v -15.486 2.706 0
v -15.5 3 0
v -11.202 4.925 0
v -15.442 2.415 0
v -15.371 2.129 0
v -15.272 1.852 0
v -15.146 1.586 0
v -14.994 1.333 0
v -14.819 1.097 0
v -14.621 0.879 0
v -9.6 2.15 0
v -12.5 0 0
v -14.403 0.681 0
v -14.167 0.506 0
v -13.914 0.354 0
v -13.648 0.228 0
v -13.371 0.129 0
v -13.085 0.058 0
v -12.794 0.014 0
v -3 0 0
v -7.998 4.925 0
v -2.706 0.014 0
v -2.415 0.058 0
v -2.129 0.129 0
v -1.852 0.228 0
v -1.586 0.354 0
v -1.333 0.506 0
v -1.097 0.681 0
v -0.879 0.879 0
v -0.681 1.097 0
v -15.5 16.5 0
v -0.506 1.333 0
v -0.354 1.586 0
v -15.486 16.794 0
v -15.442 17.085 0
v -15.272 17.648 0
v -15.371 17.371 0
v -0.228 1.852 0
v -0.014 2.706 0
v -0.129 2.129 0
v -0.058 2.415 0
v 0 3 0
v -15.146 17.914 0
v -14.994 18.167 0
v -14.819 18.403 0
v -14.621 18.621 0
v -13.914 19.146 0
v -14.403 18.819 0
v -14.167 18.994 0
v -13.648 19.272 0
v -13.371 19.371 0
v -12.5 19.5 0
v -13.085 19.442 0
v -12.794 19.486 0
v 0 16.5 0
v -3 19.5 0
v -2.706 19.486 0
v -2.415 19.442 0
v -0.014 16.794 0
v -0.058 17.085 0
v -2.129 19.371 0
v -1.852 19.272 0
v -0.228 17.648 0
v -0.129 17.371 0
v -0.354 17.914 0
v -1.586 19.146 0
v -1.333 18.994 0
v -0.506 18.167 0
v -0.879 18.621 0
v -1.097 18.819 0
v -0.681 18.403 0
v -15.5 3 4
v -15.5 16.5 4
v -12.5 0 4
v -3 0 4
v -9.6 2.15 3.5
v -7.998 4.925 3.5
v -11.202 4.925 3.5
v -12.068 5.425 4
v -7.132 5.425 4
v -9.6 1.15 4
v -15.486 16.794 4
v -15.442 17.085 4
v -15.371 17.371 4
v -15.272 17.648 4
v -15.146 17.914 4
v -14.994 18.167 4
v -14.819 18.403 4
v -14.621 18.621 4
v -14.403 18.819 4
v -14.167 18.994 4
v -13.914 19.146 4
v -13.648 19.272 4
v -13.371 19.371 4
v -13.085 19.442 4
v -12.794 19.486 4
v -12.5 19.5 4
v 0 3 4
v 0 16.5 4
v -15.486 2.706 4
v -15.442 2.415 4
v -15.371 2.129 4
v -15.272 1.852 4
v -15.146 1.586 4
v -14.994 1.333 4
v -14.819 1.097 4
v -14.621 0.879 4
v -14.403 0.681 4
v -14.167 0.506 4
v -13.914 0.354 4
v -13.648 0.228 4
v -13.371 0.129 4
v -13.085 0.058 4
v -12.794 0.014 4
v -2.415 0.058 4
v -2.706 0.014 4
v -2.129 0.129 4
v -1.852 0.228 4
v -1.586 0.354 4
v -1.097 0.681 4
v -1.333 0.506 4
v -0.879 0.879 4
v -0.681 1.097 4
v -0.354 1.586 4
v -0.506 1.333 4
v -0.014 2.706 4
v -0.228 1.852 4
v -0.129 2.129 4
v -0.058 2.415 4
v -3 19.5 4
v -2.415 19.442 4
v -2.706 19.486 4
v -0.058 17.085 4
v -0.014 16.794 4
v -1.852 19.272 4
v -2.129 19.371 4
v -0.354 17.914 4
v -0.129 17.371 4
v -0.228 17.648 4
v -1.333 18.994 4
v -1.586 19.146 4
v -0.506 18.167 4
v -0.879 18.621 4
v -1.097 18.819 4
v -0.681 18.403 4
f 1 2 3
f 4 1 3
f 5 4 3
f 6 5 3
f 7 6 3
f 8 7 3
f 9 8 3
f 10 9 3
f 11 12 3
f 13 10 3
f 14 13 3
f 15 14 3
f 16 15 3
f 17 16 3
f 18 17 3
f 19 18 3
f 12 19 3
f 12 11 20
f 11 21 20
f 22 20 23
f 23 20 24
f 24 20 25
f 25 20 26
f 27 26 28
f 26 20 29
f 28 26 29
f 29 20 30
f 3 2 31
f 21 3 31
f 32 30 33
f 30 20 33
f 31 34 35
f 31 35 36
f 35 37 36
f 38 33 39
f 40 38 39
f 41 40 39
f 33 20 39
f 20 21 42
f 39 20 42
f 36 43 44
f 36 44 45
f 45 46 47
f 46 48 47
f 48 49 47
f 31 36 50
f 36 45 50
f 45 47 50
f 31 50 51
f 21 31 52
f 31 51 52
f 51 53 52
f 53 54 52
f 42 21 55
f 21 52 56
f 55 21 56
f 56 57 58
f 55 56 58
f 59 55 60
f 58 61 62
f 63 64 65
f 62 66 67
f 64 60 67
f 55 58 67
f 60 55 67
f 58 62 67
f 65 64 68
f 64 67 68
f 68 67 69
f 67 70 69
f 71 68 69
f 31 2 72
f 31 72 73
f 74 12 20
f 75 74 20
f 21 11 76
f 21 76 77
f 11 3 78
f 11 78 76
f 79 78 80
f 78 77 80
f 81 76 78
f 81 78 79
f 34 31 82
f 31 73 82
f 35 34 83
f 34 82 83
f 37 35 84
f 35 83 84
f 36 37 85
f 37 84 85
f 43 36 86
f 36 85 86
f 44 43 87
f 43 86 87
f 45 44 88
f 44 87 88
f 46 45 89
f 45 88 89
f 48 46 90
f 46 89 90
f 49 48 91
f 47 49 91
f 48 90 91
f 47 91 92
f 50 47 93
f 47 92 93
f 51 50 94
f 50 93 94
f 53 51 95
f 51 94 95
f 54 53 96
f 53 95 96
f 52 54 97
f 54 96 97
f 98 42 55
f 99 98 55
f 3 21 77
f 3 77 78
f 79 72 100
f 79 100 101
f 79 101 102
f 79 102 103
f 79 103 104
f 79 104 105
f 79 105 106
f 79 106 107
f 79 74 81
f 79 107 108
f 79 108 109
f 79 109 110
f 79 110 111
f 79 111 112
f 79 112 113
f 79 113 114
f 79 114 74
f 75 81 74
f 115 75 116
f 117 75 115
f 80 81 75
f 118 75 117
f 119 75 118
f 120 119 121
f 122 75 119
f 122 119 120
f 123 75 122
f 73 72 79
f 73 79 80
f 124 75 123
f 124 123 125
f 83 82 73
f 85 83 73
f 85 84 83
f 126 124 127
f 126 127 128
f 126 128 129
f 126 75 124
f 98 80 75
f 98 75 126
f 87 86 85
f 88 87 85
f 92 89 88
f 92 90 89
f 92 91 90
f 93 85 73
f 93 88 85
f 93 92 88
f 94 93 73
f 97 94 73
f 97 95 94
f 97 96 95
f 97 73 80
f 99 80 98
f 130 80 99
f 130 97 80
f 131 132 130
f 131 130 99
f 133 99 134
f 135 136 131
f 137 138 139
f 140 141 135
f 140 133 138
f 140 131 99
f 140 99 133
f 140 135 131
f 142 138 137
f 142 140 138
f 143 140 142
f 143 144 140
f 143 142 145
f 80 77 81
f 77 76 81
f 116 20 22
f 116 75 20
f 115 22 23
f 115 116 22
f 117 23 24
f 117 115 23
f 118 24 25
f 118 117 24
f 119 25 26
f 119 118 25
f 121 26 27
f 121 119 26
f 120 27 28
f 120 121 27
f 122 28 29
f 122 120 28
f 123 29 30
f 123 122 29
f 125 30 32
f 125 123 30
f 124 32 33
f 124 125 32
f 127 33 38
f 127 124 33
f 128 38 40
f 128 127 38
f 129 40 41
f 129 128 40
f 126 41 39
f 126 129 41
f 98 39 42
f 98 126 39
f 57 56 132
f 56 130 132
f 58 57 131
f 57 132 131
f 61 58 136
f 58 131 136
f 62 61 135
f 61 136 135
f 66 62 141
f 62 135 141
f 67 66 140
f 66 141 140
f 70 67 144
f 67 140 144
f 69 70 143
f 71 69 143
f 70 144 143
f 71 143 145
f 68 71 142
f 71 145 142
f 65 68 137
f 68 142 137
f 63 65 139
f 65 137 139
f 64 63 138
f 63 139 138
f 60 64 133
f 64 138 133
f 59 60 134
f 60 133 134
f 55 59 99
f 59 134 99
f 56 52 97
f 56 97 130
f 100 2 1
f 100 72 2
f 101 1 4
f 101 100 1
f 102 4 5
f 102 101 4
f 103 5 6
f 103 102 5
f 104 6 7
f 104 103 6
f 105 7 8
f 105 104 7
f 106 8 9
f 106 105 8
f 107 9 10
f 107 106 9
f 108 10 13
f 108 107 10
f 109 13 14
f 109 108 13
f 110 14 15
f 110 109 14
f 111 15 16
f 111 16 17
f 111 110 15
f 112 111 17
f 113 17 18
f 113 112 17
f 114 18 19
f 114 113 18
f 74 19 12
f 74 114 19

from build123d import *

# Parameters (mm, degrees)
F0_W     = 15.5
F0_H     = 19.5
F1_DEPTH = 4
F3_DEPTH = 4.001
F4_SIZE  = 0.5
F5_R     = 3


with BuildPart() as f1:
    # F0 (on Top) → F1 (new body)
    with BuildSketch(Plane.XY):
        with Locations((-7.75, 9.75)):
            Rectangle(F0_W, F0_H)
    extrude(amount=F1_DEPTH)

    # F2 (on Top) → F3 (cut, through all)
    with BuildSketch(Plane.XY):
        Polygon((-11.202147, 4.925), (-9.6, 2.15), (-7.997853, 4.925), align=None)
    extrude(amount=F3_DEPTH, mode=Mode.SUBTRACT)

    # F4
    f4_edges = [f1.edges().sort_by_distance(p)[0] for p in [
        (-9.6, 4.925, 4),
        (-10.401073, 3.5375, 4),
        (-8.798927, 3.5375, 4),
    ]]
    chamfer(f4_edges, length=F4_SIZE)

    # F5
    f5_edges = [f1.edges().sort_by_distance(p)[0] for p in [
        (-15.5, 0, 2),
        (0, 0, 2),
        (0, 19.5, 2),
        (-15.5, 19.5, 2),
    ]]
    fillet(f5_edges, radius=F5_R)


solid = f1.part
